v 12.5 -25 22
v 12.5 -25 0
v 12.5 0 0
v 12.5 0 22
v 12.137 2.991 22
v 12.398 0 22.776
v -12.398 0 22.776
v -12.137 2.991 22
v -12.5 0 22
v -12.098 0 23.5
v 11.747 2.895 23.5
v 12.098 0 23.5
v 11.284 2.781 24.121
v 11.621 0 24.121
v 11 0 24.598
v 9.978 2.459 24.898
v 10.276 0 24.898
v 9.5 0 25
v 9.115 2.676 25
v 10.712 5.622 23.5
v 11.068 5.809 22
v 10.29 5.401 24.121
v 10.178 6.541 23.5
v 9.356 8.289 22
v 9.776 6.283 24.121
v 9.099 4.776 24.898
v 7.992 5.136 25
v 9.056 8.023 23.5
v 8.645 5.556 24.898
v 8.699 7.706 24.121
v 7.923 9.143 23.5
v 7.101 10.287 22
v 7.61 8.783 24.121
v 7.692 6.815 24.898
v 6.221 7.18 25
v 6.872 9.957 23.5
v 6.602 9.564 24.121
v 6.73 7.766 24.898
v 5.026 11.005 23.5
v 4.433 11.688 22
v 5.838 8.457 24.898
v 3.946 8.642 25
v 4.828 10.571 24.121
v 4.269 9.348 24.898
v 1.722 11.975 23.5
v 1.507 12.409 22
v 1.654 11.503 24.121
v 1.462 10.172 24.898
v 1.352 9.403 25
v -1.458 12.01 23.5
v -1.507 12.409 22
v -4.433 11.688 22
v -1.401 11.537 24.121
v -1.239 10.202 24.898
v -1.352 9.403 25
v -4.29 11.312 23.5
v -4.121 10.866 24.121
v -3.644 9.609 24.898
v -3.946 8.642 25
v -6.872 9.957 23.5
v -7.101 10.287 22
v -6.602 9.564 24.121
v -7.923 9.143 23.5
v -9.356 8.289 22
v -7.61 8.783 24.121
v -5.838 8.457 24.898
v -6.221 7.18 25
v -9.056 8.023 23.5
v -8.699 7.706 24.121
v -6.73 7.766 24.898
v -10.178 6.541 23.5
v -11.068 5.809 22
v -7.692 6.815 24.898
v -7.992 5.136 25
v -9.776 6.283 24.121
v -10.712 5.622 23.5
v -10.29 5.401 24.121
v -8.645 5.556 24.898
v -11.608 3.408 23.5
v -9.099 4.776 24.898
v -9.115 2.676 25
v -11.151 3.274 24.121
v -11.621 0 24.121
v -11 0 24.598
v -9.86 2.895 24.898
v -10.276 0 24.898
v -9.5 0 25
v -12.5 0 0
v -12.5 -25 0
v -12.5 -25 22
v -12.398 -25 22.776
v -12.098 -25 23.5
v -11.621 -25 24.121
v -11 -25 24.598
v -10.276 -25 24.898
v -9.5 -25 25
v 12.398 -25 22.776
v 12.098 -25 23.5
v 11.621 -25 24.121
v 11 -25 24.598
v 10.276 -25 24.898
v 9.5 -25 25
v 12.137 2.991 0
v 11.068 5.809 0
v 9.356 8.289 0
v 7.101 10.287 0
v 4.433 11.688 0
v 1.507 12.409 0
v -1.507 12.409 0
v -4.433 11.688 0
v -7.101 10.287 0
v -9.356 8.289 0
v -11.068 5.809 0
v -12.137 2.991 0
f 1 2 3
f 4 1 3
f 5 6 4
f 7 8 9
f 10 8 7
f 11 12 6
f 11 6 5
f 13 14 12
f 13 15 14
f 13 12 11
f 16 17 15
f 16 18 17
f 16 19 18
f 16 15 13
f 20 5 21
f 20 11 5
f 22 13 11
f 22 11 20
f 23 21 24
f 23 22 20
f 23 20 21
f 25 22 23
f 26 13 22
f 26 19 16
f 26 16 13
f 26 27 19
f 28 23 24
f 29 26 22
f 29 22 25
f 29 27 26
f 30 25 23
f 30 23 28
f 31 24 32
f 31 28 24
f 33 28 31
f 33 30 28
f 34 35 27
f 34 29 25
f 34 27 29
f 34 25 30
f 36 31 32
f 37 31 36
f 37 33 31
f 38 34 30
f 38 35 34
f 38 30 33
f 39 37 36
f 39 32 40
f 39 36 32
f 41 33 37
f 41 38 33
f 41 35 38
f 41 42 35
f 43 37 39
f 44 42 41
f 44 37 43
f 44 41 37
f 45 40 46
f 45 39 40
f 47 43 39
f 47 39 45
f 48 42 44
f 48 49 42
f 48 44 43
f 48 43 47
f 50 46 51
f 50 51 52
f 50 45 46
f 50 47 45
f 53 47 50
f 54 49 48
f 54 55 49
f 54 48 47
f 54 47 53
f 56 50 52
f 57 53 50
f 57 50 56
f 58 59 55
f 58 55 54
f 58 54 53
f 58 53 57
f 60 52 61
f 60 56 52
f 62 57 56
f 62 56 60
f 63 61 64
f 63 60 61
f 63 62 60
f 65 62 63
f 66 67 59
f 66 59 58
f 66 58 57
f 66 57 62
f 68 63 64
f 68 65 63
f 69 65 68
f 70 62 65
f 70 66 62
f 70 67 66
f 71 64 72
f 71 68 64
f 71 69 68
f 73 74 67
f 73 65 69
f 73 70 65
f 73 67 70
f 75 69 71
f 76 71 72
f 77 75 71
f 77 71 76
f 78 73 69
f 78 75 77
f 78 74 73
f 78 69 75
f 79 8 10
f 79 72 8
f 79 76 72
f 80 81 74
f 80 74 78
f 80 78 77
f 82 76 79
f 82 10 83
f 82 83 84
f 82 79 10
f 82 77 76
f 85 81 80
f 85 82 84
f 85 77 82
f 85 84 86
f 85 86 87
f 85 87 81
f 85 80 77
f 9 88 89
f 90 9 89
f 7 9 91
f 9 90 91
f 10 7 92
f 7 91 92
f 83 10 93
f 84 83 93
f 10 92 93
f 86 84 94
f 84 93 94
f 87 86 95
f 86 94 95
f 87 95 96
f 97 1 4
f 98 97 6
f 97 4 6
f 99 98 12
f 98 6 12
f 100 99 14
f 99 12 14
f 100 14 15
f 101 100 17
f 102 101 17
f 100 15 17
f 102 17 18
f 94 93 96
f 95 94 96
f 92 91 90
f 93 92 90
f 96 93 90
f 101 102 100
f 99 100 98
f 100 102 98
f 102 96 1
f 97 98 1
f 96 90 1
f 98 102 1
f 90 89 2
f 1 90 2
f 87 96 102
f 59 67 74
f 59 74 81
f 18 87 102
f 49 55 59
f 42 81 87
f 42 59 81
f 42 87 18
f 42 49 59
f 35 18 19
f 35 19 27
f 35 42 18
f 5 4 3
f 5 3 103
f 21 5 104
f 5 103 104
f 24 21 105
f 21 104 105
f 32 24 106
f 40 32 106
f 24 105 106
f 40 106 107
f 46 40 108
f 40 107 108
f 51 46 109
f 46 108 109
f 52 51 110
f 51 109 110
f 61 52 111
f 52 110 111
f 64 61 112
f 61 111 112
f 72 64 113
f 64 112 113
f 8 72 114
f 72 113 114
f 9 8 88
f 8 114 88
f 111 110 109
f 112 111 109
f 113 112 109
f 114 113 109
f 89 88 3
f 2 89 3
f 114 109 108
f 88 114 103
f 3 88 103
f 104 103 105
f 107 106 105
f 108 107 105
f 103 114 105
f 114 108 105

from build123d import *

# Parameters (mm, degrees)
EXTRUDE_1_DEPTH = 25
FILLET_1_R      = 3


with BuildPart() as part:
    # Эскиз1 → Бобышка-Вытянуть1 (new body)
    with BuildSketch(Plane.XY):
        with BuildLine():
            Line((-12.5, 0), (-12.5, -25))
            Line((-12.5, -25), (12.5, -25))
            Line((12.5, -25), (12.5, 0))
            ThreePointArc((12.5, 0), (0, 12.5), (-12.5, 0))
        make_face()
    extrude(amount=EXTRUDE_1_DEPTH)

    # Скругление1
    fillet_1_edges = [part.edges().sort_by_distance(p)[0] for p in [
        (12.5, -12.5, 25),
        (0, 12.5, 25),
        (-12.5, -12.5, 25),
    ]]
    fillet(fillet_1_edges, radius=FILLET_1_R)


solid = part.part
